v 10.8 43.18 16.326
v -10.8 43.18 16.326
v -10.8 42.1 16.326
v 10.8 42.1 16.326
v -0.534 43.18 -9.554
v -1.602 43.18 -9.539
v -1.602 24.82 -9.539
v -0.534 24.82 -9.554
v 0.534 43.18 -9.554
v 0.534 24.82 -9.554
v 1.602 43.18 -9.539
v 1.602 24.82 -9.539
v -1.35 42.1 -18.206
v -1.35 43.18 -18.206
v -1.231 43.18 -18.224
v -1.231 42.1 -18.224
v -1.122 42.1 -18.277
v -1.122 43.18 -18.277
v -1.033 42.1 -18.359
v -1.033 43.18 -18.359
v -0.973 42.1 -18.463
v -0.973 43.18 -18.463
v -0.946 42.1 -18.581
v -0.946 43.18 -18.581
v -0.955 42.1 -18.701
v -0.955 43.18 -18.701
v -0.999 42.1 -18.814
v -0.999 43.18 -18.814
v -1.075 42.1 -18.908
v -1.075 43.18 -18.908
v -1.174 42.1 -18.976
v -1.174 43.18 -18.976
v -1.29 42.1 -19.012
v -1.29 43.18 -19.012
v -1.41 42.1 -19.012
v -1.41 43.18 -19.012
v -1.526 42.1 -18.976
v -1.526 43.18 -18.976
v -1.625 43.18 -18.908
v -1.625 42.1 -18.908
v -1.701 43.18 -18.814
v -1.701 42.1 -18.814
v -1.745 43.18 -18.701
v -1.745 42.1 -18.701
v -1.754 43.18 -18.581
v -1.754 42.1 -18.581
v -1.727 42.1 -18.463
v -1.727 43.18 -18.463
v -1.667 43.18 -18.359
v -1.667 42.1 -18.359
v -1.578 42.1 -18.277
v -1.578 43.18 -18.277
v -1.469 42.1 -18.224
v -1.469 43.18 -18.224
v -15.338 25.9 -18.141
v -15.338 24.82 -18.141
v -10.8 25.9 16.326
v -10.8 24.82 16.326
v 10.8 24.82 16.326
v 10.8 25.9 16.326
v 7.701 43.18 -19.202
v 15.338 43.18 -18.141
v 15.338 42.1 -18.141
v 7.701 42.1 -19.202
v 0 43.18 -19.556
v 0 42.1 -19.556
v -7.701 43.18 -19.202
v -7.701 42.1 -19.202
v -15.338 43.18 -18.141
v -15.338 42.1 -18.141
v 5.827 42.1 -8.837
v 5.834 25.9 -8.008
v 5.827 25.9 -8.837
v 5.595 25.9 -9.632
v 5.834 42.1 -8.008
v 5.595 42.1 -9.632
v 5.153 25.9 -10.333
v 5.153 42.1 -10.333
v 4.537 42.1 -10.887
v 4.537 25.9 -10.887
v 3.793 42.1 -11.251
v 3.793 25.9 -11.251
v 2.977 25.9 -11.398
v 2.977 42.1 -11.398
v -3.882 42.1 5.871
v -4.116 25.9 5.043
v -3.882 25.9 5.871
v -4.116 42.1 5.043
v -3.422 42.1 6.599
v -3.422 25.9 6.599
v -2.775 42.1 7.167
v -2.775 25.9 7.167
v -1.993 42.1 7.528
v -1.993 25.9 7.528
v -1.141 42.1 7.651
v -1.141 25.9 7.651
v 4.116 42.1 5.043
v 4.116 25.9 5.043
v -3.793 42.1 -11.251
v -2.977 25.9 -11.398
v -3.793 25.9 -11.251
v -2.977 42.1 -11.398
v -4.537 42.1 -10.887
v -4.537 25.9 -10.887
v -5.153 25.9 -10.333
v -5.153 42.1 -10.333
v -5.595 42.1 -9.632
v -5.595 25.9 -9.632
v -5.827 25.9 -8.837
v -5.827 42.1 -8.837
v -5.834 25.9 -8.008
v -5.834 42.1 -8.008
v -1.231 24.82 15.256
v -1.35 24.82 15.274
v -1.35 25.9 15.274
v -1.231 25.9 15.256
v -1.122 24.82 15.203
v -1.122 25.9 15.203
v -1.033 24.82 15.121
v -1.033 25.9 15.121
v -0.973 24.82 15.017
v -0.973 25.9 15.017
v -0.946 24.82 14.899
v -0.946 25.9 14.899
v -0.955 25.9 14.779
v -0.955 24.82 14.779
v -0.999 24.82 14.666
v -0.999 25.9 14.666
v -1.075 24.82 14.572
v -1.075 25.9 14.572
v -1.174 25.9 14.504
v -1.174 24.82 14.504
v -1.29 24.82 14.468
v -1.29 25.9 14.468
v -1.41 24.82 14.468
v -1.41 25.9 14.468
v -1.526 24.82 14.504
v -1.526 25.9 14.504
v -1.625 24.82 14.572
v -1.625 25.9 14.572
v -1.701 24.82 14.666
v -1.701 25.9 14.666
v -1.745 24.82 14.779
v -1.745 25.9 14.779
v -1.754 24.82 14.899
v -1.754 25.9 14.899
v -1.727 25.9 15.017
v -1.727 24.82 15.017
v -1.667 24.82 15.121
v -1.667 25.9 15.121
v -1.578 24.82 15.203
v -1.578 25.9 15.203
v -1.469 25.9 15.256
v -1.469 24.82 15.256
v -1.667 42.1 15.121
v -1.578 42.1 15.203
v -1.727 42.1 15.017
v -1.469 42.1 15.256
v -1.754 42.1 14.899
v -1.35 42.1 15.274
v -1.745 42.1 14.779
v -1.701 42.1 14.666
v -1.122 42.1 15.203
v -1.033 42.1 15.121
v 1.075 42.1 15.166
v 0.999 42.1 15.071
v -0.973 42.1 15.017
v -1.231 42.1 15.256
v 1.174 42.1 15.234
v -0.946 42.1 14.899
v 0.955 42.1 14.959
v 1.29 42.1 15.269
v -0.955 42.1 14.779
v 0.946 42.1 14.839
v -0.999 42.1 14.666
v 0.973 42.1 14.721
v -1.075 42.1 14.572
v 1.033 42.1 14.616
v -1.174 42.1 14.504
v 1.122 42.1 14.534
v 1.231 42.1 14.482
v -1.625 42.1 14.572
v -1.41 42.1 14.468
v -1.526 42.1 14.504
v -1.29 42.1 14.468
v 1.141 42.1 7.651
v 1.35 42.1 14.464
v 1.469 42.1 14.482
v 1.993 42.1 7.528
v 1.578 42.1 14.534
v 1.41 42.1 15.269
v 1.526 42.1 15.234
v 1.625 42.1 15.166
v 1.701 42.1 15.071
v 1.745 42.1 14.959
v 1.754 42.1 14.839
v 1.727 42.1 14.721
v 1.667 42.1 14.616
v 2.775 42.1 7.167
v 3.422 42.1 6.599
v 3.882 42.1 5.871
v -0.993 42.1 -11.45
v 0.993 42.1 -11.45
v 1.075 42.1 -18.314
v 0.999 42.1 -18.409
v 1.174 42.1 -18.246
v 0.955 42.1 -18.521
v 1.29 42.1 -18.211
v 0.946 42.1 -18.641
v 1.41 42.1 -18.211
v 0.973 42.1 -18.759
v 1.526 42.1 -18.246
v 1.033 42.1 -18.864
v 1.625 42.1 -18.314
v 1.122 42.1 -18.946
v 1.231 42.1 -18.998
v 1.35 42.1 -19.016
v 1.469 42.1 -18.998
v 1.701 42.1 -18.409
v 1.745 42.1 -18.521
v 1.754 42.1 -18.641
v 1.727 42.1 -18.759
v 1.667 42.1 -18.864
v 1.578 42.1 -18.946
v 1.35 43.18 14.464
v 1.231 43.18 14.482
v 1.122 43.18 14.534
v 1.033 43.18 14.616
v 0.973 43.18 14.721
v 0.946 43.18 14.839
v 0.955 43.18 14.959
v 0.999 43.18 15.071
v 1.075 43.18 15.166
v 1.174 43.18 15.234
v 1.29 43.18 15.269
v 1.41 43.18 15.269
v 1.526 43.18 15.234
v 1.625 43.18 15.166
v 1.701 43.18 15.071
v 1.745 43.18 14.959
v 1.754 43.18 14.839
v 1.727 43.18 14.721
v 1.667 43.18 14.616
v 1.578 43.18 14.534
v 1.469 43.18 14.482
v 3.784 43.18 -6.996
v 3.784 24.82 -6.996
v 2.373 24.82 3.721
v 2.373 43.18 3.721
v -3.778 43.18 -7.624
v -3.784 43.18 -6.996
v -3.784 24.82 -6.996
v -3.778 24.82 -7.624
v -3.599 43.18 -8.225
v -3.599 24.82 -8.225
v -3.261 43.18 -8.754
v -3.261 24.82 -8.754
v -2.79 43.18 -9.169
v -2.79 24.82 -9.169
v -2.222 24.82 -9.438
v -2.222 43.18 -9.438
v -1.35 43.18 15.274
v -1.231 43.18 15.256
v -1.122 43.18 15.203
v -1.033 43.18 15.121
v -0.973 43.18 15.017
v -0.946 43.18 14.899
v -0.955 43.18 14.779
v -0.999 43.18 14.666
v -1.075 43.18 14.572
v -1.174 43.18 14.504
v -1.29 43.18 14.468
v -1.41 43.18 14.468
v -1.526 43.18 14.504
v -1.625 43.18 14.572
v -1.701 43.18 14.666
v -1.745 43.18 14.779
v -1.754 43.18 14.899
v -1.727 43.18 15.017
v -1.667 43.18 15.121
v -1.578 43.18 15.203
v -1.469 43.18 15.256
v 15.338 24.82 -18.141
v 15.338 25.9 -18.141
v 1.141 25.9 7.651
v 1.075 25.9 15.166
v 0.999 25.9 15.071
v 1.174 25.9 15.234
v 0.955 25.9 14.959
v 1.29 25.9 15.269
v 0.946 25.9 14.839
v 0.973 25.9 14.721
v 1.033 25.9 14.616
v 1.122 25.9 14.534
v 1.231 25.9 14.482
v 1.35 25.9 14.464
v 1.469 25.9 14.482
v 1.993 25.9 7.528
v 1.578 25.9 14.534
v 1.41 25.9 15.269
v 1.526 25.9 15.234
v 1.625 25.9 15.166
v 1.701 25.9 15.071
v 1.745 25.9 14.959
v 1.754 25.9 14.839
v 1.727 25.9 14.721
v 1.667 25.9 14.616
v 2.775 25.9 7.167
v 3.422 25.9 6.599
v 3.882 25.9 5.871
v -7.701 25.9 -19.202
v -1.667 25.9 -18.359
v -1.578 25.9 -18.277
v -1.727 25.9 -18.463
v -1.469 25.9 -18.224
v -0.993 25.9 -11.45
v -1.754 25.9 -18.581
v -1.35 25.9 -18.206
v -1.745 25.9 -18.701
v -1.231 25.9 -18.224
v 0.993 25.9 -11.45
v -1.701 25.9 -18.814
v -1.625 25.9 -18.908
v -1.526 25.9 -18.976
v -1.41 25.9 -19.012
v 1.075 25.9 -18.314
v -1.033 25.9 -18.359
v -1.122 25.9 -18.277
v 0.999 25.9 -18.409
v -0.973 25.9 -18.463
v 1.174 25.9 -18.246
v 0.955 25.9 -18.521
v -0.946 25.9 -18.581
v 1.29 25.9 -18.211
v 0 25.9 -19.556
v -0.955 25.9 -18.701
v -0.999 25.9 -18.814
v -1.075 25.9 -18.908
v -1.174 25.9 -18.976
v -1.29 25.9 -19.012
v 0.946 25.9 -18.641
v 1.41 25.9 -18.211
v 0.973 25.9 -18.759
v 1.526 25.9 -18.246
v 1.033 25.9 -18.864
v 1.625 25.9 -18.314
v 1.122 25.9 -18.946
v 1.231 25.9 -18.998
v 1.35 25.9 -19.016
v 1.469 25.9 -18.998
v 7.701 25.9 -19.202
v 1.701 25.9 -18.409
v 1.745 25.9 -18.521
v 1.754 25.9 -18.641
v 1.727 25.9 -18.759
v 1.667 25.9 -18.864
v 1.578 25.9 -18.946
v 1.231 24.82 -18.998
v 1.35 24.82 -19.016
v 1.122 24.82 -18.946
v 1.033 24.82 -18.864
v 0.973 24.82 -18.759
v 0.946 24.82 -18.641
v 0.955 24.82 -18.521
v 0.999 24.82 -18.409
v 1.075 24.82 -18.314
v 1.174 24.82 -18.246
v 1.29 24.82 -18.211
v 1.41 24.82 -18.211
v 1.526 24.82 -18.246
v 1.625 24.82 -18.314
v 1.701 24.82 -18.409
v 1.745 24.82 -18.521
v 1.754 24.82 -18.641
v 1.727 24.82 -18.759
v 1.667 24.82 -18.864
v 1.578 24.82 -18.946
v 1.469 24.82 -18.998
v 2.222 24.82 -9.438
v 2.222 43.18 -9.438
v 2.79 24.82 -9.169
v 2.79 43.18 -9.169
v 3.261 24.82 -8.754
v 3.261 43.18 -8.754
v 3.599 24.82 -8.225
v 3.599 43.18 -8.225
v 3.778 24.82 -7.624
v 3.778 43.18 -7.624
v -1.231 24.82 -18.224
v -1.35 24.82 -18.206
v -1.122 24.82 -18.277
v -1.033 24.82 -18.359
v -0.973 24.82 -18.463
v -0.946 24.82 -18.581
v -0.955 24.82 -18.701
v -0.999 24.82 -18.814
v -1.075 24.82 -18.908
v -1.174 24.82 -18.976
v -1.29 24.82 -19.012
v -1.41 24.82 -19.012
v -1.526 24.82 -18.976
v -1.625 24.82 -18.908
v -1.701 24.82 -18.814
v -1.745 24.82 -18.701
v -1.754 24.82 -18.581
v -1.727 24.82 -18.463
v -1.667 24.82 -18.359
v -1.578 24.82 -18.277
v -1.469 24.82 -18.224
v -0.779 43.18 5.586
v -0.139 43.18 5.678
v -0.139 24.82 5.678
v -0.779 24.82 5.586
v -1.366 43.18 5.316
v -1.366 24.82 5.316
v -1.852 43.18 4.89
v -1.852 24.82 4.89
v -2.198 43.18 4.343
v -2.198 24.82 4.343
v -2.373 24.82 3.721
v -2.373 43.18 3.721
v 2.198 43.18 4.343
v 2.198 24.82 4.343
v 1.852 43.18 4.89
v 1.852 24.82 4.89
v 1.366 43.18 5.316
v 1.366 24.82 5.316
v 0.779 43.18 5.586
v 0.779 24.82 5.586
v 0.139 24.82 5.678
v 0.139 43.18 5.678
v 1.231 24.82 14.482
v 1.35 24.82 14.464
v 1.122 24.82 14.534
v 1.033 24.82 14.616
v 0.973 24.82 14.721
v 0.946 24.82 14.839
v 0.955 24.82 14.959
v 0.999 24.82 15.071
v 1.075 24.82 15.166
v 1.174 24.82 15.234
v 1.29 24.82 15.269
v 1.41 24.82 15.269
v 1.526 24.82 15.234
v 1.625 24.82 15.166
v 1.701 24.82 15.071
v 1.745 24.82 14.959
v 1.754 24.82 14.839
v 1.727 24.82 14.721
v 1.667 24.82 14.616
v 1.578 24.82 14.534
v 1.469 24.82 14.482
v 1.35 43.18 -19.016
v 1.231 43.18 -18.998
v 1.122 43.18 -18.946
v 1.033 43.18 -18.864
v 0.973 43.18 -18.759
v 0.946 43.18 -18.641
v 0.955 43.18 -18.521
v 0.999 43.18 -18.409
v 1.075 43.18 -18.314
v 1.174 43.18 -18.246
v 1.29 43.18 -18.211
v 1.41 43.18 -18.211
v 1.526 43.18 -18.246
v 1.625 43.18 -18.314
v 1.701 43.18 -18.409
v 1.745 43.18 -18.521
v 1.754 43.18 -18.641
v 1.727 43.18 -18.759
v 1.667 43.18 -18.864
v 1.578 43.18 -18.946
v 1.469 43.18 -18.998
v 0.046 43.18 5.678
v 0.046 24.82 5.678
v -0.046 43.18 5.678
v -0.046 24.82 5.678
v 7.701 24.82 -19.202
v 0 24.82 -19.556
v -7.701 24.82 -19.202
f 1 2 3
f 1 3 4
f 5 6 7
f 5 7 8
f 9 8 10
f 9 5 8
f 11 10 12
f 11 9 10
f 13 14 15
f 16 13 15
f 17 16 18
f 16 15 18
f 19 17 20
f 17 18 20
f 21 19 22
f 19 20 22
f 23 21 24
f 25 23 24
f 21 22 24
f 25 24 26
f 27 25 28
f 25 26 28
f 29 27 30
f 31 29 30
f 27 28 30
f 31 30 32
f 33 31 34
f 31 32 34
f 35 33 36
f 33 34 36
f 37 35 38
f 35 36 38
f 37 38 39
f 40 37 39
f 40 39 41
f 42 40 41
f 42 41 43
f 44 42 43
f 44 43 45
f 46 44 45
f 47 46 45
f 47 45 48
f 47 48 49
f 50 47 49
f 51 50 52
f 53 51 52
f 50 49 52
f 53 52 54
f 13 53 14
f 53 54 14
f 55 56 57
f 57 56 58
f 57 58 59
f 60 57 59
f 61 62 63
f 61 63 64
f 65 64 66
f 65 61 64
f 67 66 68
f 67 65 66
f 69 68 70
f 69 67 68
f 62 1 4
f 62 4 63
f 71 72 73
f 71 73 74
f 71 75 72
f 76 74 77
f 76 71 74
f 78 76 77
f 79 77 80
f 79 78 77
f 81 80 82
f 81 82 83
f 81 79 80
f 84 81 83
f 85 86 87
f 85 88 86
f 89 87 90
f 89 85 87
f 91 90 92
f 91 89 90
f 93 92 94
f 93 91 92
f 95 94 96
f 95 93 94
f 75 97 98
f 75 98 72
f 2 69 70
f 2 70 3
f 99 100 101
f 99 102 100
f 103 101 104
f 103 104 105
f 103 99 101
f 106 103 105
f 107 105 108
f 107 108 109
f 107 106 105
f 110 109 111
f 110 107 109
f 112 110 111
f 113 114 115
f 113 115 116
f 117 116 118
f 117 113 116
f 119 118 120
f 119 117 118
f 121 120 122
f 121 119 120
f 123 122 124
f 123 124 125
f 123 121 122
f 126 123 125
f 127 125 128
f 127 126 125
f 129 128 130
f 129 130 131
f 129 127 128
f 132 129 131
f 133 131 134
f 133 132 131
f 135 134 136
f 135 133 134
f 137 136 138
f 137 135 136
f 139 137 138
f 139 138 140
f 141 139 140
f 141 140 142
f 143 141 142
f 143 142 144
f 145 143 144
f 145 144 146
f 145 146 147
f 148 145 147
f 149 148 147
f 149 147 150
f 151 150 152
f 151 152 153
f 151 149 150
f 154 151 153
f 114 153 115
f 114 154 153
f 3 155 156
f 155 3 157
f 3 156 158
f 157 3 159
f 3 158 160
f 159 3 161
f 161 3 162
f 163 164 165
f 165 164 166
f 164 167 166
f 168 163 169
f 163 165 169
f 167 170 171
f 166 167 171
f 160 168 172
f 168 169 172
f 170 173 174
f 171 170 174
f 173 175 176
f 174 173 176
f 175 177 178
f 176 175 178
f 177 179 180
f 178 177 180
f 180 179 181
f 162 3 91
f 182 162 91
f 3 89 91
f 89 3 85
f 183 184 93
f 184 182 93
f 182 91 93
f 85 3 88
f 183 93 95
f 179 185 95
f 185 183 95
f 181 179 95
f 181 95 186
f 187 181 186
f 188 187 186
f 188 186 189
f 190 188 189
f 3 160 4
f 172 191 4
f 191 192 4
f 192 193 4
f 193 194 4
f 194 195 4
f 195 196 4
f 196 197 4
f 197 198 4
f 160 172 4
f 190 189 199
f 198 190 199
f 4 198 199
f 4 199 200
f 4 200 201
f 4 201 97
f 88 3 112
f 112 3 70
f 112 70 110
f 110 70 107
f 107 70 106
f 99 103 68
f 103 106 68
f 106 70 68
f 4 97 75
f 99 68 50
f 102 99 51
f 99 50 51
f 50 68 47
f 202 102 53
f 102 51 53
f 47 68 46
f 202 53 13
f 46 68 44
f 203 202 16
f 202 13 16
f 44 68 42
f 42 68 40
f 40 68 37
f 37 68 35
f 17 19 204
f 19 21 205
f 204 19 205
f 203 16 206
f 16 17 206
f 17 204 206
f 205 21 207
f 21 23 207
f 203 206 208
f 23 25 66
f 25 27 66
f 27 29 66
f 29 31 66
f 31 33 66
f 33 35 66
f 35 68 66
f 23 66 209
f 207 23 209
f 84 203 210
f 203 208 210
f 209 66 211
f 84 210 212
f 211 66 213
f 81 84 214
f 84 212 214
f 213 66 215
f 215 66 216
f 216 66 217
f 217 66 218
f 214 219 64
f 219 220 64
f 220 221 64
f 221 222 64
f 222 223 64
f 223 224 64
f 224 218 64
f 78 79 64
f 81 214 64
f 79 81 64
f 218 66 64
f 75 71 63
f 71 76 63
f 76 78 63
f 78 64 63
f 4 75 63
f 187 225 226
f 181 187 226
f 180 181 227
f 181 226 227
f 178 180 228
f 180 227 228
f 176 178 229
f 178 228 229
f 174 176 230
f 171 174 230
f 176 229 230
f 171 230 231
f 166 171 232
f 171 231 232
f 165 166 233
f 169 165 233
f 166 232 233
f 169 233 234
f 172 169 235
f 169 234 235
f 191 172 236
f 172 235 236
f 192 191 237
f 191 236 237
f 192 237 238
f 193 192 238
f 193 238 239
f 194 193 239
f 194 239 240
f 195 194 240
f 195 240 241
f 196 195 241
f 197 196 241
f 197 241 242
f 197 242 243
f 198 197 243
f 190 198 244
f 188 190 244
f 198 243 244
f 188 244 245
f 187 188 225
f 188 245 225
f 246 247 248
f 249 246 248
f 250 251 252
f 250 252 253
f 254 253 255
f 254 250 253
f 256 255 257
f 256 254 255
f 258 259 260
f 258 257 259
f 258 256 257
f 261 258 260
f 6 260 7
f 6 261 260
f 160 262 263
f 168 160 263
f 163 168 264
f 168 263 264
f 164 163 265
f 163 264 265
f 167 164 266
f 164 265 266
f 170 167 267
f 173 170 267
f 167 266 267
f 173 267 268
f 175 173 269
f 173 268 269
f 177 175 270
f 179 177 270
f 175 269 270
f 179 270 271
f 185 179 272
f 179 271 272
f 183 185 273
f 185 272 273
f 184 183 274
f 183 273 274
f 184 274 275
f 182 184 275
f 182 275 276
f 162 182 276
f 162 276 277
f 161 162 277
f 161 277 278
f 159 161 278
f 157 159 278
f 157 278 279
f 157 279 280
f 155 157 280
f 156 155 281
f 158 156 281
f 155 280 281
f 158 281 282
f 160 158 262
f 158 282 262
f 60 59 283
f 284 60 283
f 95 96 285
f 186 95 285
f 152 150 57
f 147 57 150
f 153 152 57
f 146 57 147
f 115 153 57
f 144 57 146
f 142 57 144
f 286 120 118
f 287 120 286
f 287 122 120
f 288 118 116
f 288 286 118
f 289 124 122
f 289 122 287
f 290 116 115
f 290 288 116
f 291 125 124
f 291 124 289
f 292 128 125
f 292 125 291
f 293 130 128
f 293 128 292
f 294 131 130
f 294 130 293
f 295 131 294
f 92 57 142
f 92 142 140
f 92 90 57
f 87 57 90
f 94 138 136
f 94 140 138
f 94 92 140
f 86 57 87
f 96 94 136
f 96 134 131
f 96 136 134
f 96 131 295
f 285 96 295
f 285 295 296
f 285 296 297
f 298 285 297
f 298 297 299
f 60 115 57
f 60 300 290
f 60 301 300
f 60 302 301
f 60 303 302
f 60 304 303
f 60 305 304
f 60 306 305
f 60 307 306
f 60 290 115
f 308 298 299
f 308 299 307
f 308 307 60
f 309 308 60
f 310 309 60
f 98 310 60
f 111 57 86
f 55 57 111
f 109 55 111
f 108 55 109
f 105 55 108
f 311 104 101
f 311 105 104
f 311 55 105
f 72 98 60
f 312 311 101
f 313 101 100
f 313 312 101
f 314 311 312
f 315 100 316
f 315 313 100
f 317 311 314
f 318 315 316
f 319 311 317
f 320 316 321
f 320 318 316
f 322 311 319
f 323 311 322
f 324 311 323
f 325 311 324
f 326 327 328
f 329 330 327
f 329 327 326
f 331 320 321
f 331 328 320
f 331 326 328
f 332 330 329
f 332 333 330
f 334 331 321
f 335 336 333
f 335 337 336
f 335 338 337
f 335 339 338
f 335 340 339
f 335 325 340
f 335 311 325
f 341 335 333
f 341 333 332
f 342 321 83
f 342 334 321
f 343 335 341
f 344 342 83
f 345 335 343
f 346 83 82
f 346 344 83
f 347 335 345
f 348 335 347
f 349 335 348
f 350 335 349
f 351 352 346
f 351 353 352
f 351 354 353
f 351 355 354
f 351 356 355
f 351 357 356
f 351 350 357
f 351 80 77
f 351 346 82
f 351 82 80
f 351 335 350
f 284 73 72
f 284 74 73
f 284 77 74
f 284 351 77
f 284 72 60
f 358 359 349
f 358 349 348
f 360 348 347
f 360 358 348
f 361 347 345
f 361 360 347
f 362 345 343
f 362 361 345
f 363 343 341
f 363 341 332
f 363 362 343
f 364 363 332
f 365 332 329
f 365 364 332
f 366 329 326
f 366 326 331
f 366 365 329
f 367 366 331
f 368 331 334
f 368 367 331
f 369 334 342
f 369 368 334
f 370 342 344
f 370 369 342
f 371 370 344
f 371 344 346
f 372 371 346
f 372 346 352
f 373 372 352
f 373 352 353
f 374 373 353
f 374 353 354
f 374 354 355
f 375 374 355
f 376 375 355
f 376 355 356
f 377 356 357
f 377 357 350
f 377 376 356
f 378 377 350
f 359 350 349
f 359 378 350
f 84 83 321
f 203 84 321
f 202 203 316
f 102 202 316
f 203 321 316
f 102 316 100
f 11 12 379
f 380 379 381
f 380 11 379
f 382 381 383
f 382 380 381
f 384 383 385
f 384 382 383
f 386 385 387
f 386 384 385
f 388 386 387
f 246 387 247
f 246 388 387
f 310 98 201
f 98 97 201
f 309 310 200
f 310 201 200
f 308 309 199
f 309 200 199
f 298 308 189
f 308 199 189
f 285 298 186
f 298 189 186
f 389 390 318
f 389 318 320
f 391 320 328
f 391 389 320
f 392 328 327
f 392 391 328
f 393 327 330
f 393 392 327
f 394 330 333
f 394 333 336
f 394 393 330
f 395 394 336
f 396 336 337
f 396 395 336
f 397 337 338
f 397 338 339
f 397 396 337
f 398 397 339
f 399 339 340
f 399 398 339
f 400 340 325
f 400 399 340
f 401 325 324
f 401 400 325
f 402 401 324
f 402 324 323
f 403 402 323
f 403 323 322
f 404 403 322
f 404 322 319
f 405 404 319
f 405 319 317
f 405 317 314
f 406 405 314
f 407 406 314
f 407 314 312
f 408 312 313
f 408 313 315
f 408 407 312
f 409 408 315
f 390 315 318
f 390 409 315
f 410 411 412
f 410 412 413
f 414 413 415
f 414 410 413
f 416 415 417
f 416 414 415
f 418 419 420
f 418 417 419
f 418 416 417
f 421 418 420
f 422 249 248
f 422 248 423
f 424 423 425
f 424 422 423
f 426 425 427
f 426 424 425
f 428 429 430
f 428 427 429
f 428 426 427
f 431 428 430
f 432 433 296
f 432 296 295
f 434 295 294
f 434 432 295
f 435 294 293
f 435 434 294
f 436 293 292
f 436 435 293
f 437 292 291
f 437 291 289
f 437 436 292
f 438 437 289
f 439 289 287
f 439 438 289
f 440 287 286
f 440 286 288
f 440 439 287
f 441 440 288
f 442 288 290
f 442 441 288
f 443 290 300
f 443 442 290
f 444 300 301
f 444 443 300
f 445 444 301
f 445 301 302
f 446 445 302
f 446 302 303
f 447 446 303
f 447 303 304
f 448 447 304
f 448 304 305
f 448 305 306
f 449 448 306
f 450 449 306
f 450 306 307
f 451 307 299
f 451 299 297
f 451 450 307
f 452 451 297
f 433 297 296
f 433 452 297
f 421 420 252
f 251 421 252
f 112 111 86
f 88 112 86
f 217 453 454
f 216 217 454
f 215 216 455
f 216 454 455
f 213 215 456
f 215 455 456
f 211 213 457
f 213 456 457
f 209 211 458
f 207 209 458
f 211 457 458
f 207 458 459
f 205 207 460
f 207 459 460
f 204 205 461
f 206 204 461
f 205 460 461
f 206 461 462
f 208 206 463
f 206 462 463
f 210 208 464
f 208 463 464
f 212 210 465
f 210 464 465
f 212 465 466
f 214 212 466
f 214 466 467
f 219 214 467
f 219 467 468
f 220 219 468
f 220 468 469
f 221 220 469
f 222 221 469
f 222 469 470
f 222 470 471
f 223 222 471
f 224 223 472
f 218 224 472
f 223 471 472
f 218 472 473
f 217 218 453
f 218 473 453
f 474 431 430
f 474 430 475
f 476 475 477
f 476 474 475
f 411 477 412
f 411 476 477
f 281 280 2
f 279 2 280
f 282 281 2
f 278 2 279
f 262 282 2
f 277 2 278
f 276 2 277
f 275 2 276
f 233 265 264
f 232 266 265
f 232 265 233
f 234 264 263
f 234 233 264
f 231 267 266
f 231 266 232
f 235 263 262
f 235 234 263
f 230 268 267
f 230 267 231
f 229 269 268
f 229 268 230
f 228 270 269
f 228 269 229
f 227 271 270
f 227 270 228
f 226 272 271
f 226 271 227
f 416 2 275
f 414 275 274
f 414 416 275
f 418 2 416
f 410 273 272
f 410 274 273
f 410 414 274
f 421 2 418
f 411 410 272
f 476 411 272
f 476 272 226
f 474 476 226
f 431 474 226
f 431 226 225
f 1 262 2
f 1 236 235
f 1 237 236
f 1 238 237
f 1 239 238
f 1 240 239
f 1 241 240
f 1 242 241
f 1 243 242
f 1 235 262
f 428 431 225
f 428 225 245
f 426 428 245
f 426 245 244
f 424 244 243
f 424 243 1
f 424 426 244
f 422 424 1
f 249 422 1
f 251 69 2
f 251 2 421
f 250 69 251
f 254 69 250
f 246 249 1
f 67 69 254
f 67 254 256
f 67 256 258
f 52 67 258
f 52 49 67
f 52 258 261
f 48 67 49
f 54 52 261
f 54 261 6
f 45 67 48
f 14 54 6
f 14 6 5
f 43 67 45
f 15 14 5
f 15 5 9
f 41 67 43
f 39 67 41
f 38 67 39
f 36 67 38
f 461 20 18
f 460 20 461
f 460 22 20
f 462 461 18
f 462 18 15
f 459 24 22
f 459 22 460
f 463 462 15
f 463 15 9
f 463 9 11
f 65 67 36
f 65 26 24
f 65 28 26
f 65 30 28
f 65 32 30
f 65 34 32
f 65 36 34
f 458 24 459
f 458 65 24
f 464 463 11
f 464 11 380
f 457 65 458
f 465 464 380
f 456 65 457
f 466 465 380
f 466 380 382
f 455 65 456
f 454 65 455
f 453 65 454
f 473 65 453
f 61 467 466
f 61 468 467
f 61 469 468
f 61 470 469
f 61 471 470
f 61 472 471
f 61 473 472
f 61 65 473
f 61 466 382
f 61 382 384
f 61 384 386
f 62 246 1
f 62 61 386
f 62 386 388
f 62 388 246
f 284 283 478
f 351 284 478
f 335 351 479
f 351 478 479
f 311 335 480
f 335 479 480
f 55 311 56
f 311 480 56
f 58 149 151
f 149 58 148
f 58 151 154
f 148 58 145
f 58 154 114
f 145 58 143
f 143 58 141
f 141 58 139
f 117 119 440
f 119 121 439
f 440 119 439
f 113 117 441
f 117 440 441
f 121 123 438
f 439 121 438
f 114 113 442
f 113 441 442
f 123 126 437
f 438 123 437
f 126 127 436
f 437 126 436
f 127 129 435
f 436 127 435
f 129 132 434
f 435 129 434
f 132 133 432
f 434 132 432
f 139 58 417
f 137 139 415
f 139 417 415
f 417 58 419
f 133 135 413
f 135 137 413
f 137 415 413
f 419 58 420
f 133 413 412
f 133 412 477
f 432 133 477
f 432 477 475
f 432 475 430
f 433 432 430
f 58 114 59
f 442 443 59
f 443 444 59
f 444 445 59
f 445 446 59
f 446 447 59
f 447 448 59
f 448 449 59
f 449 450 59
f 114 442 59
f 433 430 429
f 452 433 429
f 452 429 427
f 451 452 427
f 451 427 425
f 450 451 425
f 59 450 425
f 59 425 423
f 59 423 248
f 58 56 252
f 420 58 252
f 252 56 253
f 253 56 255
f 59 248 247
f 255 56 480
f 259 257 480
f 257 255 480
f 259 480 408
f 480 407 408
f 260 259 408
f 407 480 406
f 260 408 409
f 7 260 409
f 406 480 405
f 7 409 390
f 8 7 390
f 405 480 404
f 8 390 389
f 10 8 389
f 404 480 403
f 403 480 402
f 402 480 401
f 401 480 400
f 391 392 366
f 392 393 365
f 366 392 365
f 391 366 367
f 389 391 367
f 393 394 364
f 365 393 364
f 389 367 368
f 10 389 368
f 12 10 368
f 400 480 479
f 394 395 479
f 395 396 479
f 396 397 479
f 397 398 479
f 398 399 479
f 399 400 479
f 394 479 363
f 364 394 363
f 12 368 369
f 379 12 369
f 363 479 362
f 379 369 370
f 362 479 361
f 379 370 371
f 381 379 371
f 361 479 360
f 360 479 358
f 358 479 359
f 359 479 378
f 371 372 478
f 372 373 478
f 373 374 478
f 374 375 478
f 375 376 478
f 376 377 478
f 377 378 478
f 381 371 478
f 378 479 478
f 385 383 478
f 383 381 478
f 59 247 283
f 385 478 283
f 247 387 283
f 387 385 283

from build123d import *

# Parameters (mm, degrees)
SKETCH1_R           = 1.5
BOSS_EXTRUDE1_DEPTH = 4
BOSS_EXTRUDE2_DEPTH = 60
SCALE1_SCALE        = 0.27
FILLET1_R           = 3
CUT_EXTRUDE1_DEPTH  = 20


with BuildPart() as part:
    # Sketch1 → Boss-Extrude1 (new body)
    with BuildSketch(Plane(origin=(0, 0, 0), x_dir=(1, 0, 0), z_dir=(0, 1, 0))):
        with BuildLine():
            Line((-56.806235592, 60.259400507), (-40, -67.396632609))
            Line((-40, -67.396632609), (40, -67.396632609))
            Line((40, -67.396632609), (56.806235592, 60.259400507))
            ThreePointArc((56.806235592, 60.259400507), (0, 65.5), (-56.806235592, 60.259400507))
        make_face()
        with Locations(Location((-5, 62, 0), (0, 0, 270))):
            Circle(SKETCH1_R, mode=Mode.SUBTRACT)
        with Locations(Location((-5, -62, 0), (0, 0, 270))):
            Circle(SKETCH1_R, mode=Mode.SUBTRACT)
        with Locations(Location((5, -62, 0), (0, 0, 90))):
            Circle(SKETCH1_R, mode=Mode.SUBTRACT)
        with Locations(Location((5, 62, 0), (0, 0, 90))):
            Circle(SKETCH1_R, mode=Mode.SUBTRACT)
    boss_extrude1 = extrude(amount=BOSS_EXTRUDE1_DEPTH)

    # Sketch2 → Boss-Extrude2 (add)
    with BuildSketch(Plane(origin=(0, 4, 0), x_dir=(1, 0, 0), z_dir=(0, 1, 0))):
        with BuildLine():
            Line((13.971014299, -35.267480529), (23.161620791, 34.542106528))
            ThreePointArc((23.161620791, 34.542106528), (0, 35.5), (-23.161620791, 34.542106528))
            Line((-23.161620791, 34.542106528), (-13.971014299, -35.267480529))
            Line((-13.971014299, -35.267480529), (13.971014299, -35.267480529))
        make_face()
    extrude(amount=BOSS_EXTRUDE2_DEPTH)

    # Mirror1: Boss-Extrude1 across plane
    add(boss_extrude1.mirror(Plane.ZX.offset(34)))


with BuildPart() as part_1:
    # Scale1: scaled about (0, 34, -2.563249607)
    add(part.part.scale(SCALE1_SCALE).moved(Location((0, 24.82, -1.871172213))))

    # Fillet1
    fillet1_edges = [part_1.edges().sort_by_distance(p)[0] for p in [
        (3.772173861, 34, 7.65104753),
        (6.253637614, 34, -11.197540976),
        (-6.253637614, 34, -11.197540976),
        (-3.772173861, 34, 7.65104753),
    ]]
    fillet(fillet1_edges, radius=FILLET1_R)

    # Sketch3 → Cut-Extrude1 (cut)
    with BuildSketch(Plane(origin=(0, 43.18, 0), x_dir=(1, 0, 0), z_dir=(0, 1, 0))):
        with BuildLine():
            ThreePointArc((2.373141134, -3.721290728), (1.624743129, -5.12027622), (0.139265082, -5.677604625))
            ThreePointArc((0.139265082, -5.677604625), (0, -5.677507909), (-0.139265082, -5.677604625))
            ThreePointArc((-0.139265082, -5.677604625), (-1.624743129, -5.12027622), (-2.373141134, -3.721290728))
            Line((-2.373141134, -3.721290728), (-3.784051042, 6.995634014))
            ThreePointArc((-3.784051042, 6.995634014), (-3.260936346, 8.754404452), (-1.602122137, 9.538788197))
            ThreePointArc((-1.602122137, 9.538788197), (0, 9.556172213), (1.602122137, 9.538788197))
            ThreePointArc((1.602122137, 9.538788197), (3.260936346, 8.754404452), (3.784051042, 6.995634014))
            Line((3.784051042, 6.995634014), (2.373141134, -3.721290728))
        make_face()
    extrude(amount=-CUT_EXTRUDE1_DEPTH, mode=Mode.SUBTRACT)


solid = part_1.part
